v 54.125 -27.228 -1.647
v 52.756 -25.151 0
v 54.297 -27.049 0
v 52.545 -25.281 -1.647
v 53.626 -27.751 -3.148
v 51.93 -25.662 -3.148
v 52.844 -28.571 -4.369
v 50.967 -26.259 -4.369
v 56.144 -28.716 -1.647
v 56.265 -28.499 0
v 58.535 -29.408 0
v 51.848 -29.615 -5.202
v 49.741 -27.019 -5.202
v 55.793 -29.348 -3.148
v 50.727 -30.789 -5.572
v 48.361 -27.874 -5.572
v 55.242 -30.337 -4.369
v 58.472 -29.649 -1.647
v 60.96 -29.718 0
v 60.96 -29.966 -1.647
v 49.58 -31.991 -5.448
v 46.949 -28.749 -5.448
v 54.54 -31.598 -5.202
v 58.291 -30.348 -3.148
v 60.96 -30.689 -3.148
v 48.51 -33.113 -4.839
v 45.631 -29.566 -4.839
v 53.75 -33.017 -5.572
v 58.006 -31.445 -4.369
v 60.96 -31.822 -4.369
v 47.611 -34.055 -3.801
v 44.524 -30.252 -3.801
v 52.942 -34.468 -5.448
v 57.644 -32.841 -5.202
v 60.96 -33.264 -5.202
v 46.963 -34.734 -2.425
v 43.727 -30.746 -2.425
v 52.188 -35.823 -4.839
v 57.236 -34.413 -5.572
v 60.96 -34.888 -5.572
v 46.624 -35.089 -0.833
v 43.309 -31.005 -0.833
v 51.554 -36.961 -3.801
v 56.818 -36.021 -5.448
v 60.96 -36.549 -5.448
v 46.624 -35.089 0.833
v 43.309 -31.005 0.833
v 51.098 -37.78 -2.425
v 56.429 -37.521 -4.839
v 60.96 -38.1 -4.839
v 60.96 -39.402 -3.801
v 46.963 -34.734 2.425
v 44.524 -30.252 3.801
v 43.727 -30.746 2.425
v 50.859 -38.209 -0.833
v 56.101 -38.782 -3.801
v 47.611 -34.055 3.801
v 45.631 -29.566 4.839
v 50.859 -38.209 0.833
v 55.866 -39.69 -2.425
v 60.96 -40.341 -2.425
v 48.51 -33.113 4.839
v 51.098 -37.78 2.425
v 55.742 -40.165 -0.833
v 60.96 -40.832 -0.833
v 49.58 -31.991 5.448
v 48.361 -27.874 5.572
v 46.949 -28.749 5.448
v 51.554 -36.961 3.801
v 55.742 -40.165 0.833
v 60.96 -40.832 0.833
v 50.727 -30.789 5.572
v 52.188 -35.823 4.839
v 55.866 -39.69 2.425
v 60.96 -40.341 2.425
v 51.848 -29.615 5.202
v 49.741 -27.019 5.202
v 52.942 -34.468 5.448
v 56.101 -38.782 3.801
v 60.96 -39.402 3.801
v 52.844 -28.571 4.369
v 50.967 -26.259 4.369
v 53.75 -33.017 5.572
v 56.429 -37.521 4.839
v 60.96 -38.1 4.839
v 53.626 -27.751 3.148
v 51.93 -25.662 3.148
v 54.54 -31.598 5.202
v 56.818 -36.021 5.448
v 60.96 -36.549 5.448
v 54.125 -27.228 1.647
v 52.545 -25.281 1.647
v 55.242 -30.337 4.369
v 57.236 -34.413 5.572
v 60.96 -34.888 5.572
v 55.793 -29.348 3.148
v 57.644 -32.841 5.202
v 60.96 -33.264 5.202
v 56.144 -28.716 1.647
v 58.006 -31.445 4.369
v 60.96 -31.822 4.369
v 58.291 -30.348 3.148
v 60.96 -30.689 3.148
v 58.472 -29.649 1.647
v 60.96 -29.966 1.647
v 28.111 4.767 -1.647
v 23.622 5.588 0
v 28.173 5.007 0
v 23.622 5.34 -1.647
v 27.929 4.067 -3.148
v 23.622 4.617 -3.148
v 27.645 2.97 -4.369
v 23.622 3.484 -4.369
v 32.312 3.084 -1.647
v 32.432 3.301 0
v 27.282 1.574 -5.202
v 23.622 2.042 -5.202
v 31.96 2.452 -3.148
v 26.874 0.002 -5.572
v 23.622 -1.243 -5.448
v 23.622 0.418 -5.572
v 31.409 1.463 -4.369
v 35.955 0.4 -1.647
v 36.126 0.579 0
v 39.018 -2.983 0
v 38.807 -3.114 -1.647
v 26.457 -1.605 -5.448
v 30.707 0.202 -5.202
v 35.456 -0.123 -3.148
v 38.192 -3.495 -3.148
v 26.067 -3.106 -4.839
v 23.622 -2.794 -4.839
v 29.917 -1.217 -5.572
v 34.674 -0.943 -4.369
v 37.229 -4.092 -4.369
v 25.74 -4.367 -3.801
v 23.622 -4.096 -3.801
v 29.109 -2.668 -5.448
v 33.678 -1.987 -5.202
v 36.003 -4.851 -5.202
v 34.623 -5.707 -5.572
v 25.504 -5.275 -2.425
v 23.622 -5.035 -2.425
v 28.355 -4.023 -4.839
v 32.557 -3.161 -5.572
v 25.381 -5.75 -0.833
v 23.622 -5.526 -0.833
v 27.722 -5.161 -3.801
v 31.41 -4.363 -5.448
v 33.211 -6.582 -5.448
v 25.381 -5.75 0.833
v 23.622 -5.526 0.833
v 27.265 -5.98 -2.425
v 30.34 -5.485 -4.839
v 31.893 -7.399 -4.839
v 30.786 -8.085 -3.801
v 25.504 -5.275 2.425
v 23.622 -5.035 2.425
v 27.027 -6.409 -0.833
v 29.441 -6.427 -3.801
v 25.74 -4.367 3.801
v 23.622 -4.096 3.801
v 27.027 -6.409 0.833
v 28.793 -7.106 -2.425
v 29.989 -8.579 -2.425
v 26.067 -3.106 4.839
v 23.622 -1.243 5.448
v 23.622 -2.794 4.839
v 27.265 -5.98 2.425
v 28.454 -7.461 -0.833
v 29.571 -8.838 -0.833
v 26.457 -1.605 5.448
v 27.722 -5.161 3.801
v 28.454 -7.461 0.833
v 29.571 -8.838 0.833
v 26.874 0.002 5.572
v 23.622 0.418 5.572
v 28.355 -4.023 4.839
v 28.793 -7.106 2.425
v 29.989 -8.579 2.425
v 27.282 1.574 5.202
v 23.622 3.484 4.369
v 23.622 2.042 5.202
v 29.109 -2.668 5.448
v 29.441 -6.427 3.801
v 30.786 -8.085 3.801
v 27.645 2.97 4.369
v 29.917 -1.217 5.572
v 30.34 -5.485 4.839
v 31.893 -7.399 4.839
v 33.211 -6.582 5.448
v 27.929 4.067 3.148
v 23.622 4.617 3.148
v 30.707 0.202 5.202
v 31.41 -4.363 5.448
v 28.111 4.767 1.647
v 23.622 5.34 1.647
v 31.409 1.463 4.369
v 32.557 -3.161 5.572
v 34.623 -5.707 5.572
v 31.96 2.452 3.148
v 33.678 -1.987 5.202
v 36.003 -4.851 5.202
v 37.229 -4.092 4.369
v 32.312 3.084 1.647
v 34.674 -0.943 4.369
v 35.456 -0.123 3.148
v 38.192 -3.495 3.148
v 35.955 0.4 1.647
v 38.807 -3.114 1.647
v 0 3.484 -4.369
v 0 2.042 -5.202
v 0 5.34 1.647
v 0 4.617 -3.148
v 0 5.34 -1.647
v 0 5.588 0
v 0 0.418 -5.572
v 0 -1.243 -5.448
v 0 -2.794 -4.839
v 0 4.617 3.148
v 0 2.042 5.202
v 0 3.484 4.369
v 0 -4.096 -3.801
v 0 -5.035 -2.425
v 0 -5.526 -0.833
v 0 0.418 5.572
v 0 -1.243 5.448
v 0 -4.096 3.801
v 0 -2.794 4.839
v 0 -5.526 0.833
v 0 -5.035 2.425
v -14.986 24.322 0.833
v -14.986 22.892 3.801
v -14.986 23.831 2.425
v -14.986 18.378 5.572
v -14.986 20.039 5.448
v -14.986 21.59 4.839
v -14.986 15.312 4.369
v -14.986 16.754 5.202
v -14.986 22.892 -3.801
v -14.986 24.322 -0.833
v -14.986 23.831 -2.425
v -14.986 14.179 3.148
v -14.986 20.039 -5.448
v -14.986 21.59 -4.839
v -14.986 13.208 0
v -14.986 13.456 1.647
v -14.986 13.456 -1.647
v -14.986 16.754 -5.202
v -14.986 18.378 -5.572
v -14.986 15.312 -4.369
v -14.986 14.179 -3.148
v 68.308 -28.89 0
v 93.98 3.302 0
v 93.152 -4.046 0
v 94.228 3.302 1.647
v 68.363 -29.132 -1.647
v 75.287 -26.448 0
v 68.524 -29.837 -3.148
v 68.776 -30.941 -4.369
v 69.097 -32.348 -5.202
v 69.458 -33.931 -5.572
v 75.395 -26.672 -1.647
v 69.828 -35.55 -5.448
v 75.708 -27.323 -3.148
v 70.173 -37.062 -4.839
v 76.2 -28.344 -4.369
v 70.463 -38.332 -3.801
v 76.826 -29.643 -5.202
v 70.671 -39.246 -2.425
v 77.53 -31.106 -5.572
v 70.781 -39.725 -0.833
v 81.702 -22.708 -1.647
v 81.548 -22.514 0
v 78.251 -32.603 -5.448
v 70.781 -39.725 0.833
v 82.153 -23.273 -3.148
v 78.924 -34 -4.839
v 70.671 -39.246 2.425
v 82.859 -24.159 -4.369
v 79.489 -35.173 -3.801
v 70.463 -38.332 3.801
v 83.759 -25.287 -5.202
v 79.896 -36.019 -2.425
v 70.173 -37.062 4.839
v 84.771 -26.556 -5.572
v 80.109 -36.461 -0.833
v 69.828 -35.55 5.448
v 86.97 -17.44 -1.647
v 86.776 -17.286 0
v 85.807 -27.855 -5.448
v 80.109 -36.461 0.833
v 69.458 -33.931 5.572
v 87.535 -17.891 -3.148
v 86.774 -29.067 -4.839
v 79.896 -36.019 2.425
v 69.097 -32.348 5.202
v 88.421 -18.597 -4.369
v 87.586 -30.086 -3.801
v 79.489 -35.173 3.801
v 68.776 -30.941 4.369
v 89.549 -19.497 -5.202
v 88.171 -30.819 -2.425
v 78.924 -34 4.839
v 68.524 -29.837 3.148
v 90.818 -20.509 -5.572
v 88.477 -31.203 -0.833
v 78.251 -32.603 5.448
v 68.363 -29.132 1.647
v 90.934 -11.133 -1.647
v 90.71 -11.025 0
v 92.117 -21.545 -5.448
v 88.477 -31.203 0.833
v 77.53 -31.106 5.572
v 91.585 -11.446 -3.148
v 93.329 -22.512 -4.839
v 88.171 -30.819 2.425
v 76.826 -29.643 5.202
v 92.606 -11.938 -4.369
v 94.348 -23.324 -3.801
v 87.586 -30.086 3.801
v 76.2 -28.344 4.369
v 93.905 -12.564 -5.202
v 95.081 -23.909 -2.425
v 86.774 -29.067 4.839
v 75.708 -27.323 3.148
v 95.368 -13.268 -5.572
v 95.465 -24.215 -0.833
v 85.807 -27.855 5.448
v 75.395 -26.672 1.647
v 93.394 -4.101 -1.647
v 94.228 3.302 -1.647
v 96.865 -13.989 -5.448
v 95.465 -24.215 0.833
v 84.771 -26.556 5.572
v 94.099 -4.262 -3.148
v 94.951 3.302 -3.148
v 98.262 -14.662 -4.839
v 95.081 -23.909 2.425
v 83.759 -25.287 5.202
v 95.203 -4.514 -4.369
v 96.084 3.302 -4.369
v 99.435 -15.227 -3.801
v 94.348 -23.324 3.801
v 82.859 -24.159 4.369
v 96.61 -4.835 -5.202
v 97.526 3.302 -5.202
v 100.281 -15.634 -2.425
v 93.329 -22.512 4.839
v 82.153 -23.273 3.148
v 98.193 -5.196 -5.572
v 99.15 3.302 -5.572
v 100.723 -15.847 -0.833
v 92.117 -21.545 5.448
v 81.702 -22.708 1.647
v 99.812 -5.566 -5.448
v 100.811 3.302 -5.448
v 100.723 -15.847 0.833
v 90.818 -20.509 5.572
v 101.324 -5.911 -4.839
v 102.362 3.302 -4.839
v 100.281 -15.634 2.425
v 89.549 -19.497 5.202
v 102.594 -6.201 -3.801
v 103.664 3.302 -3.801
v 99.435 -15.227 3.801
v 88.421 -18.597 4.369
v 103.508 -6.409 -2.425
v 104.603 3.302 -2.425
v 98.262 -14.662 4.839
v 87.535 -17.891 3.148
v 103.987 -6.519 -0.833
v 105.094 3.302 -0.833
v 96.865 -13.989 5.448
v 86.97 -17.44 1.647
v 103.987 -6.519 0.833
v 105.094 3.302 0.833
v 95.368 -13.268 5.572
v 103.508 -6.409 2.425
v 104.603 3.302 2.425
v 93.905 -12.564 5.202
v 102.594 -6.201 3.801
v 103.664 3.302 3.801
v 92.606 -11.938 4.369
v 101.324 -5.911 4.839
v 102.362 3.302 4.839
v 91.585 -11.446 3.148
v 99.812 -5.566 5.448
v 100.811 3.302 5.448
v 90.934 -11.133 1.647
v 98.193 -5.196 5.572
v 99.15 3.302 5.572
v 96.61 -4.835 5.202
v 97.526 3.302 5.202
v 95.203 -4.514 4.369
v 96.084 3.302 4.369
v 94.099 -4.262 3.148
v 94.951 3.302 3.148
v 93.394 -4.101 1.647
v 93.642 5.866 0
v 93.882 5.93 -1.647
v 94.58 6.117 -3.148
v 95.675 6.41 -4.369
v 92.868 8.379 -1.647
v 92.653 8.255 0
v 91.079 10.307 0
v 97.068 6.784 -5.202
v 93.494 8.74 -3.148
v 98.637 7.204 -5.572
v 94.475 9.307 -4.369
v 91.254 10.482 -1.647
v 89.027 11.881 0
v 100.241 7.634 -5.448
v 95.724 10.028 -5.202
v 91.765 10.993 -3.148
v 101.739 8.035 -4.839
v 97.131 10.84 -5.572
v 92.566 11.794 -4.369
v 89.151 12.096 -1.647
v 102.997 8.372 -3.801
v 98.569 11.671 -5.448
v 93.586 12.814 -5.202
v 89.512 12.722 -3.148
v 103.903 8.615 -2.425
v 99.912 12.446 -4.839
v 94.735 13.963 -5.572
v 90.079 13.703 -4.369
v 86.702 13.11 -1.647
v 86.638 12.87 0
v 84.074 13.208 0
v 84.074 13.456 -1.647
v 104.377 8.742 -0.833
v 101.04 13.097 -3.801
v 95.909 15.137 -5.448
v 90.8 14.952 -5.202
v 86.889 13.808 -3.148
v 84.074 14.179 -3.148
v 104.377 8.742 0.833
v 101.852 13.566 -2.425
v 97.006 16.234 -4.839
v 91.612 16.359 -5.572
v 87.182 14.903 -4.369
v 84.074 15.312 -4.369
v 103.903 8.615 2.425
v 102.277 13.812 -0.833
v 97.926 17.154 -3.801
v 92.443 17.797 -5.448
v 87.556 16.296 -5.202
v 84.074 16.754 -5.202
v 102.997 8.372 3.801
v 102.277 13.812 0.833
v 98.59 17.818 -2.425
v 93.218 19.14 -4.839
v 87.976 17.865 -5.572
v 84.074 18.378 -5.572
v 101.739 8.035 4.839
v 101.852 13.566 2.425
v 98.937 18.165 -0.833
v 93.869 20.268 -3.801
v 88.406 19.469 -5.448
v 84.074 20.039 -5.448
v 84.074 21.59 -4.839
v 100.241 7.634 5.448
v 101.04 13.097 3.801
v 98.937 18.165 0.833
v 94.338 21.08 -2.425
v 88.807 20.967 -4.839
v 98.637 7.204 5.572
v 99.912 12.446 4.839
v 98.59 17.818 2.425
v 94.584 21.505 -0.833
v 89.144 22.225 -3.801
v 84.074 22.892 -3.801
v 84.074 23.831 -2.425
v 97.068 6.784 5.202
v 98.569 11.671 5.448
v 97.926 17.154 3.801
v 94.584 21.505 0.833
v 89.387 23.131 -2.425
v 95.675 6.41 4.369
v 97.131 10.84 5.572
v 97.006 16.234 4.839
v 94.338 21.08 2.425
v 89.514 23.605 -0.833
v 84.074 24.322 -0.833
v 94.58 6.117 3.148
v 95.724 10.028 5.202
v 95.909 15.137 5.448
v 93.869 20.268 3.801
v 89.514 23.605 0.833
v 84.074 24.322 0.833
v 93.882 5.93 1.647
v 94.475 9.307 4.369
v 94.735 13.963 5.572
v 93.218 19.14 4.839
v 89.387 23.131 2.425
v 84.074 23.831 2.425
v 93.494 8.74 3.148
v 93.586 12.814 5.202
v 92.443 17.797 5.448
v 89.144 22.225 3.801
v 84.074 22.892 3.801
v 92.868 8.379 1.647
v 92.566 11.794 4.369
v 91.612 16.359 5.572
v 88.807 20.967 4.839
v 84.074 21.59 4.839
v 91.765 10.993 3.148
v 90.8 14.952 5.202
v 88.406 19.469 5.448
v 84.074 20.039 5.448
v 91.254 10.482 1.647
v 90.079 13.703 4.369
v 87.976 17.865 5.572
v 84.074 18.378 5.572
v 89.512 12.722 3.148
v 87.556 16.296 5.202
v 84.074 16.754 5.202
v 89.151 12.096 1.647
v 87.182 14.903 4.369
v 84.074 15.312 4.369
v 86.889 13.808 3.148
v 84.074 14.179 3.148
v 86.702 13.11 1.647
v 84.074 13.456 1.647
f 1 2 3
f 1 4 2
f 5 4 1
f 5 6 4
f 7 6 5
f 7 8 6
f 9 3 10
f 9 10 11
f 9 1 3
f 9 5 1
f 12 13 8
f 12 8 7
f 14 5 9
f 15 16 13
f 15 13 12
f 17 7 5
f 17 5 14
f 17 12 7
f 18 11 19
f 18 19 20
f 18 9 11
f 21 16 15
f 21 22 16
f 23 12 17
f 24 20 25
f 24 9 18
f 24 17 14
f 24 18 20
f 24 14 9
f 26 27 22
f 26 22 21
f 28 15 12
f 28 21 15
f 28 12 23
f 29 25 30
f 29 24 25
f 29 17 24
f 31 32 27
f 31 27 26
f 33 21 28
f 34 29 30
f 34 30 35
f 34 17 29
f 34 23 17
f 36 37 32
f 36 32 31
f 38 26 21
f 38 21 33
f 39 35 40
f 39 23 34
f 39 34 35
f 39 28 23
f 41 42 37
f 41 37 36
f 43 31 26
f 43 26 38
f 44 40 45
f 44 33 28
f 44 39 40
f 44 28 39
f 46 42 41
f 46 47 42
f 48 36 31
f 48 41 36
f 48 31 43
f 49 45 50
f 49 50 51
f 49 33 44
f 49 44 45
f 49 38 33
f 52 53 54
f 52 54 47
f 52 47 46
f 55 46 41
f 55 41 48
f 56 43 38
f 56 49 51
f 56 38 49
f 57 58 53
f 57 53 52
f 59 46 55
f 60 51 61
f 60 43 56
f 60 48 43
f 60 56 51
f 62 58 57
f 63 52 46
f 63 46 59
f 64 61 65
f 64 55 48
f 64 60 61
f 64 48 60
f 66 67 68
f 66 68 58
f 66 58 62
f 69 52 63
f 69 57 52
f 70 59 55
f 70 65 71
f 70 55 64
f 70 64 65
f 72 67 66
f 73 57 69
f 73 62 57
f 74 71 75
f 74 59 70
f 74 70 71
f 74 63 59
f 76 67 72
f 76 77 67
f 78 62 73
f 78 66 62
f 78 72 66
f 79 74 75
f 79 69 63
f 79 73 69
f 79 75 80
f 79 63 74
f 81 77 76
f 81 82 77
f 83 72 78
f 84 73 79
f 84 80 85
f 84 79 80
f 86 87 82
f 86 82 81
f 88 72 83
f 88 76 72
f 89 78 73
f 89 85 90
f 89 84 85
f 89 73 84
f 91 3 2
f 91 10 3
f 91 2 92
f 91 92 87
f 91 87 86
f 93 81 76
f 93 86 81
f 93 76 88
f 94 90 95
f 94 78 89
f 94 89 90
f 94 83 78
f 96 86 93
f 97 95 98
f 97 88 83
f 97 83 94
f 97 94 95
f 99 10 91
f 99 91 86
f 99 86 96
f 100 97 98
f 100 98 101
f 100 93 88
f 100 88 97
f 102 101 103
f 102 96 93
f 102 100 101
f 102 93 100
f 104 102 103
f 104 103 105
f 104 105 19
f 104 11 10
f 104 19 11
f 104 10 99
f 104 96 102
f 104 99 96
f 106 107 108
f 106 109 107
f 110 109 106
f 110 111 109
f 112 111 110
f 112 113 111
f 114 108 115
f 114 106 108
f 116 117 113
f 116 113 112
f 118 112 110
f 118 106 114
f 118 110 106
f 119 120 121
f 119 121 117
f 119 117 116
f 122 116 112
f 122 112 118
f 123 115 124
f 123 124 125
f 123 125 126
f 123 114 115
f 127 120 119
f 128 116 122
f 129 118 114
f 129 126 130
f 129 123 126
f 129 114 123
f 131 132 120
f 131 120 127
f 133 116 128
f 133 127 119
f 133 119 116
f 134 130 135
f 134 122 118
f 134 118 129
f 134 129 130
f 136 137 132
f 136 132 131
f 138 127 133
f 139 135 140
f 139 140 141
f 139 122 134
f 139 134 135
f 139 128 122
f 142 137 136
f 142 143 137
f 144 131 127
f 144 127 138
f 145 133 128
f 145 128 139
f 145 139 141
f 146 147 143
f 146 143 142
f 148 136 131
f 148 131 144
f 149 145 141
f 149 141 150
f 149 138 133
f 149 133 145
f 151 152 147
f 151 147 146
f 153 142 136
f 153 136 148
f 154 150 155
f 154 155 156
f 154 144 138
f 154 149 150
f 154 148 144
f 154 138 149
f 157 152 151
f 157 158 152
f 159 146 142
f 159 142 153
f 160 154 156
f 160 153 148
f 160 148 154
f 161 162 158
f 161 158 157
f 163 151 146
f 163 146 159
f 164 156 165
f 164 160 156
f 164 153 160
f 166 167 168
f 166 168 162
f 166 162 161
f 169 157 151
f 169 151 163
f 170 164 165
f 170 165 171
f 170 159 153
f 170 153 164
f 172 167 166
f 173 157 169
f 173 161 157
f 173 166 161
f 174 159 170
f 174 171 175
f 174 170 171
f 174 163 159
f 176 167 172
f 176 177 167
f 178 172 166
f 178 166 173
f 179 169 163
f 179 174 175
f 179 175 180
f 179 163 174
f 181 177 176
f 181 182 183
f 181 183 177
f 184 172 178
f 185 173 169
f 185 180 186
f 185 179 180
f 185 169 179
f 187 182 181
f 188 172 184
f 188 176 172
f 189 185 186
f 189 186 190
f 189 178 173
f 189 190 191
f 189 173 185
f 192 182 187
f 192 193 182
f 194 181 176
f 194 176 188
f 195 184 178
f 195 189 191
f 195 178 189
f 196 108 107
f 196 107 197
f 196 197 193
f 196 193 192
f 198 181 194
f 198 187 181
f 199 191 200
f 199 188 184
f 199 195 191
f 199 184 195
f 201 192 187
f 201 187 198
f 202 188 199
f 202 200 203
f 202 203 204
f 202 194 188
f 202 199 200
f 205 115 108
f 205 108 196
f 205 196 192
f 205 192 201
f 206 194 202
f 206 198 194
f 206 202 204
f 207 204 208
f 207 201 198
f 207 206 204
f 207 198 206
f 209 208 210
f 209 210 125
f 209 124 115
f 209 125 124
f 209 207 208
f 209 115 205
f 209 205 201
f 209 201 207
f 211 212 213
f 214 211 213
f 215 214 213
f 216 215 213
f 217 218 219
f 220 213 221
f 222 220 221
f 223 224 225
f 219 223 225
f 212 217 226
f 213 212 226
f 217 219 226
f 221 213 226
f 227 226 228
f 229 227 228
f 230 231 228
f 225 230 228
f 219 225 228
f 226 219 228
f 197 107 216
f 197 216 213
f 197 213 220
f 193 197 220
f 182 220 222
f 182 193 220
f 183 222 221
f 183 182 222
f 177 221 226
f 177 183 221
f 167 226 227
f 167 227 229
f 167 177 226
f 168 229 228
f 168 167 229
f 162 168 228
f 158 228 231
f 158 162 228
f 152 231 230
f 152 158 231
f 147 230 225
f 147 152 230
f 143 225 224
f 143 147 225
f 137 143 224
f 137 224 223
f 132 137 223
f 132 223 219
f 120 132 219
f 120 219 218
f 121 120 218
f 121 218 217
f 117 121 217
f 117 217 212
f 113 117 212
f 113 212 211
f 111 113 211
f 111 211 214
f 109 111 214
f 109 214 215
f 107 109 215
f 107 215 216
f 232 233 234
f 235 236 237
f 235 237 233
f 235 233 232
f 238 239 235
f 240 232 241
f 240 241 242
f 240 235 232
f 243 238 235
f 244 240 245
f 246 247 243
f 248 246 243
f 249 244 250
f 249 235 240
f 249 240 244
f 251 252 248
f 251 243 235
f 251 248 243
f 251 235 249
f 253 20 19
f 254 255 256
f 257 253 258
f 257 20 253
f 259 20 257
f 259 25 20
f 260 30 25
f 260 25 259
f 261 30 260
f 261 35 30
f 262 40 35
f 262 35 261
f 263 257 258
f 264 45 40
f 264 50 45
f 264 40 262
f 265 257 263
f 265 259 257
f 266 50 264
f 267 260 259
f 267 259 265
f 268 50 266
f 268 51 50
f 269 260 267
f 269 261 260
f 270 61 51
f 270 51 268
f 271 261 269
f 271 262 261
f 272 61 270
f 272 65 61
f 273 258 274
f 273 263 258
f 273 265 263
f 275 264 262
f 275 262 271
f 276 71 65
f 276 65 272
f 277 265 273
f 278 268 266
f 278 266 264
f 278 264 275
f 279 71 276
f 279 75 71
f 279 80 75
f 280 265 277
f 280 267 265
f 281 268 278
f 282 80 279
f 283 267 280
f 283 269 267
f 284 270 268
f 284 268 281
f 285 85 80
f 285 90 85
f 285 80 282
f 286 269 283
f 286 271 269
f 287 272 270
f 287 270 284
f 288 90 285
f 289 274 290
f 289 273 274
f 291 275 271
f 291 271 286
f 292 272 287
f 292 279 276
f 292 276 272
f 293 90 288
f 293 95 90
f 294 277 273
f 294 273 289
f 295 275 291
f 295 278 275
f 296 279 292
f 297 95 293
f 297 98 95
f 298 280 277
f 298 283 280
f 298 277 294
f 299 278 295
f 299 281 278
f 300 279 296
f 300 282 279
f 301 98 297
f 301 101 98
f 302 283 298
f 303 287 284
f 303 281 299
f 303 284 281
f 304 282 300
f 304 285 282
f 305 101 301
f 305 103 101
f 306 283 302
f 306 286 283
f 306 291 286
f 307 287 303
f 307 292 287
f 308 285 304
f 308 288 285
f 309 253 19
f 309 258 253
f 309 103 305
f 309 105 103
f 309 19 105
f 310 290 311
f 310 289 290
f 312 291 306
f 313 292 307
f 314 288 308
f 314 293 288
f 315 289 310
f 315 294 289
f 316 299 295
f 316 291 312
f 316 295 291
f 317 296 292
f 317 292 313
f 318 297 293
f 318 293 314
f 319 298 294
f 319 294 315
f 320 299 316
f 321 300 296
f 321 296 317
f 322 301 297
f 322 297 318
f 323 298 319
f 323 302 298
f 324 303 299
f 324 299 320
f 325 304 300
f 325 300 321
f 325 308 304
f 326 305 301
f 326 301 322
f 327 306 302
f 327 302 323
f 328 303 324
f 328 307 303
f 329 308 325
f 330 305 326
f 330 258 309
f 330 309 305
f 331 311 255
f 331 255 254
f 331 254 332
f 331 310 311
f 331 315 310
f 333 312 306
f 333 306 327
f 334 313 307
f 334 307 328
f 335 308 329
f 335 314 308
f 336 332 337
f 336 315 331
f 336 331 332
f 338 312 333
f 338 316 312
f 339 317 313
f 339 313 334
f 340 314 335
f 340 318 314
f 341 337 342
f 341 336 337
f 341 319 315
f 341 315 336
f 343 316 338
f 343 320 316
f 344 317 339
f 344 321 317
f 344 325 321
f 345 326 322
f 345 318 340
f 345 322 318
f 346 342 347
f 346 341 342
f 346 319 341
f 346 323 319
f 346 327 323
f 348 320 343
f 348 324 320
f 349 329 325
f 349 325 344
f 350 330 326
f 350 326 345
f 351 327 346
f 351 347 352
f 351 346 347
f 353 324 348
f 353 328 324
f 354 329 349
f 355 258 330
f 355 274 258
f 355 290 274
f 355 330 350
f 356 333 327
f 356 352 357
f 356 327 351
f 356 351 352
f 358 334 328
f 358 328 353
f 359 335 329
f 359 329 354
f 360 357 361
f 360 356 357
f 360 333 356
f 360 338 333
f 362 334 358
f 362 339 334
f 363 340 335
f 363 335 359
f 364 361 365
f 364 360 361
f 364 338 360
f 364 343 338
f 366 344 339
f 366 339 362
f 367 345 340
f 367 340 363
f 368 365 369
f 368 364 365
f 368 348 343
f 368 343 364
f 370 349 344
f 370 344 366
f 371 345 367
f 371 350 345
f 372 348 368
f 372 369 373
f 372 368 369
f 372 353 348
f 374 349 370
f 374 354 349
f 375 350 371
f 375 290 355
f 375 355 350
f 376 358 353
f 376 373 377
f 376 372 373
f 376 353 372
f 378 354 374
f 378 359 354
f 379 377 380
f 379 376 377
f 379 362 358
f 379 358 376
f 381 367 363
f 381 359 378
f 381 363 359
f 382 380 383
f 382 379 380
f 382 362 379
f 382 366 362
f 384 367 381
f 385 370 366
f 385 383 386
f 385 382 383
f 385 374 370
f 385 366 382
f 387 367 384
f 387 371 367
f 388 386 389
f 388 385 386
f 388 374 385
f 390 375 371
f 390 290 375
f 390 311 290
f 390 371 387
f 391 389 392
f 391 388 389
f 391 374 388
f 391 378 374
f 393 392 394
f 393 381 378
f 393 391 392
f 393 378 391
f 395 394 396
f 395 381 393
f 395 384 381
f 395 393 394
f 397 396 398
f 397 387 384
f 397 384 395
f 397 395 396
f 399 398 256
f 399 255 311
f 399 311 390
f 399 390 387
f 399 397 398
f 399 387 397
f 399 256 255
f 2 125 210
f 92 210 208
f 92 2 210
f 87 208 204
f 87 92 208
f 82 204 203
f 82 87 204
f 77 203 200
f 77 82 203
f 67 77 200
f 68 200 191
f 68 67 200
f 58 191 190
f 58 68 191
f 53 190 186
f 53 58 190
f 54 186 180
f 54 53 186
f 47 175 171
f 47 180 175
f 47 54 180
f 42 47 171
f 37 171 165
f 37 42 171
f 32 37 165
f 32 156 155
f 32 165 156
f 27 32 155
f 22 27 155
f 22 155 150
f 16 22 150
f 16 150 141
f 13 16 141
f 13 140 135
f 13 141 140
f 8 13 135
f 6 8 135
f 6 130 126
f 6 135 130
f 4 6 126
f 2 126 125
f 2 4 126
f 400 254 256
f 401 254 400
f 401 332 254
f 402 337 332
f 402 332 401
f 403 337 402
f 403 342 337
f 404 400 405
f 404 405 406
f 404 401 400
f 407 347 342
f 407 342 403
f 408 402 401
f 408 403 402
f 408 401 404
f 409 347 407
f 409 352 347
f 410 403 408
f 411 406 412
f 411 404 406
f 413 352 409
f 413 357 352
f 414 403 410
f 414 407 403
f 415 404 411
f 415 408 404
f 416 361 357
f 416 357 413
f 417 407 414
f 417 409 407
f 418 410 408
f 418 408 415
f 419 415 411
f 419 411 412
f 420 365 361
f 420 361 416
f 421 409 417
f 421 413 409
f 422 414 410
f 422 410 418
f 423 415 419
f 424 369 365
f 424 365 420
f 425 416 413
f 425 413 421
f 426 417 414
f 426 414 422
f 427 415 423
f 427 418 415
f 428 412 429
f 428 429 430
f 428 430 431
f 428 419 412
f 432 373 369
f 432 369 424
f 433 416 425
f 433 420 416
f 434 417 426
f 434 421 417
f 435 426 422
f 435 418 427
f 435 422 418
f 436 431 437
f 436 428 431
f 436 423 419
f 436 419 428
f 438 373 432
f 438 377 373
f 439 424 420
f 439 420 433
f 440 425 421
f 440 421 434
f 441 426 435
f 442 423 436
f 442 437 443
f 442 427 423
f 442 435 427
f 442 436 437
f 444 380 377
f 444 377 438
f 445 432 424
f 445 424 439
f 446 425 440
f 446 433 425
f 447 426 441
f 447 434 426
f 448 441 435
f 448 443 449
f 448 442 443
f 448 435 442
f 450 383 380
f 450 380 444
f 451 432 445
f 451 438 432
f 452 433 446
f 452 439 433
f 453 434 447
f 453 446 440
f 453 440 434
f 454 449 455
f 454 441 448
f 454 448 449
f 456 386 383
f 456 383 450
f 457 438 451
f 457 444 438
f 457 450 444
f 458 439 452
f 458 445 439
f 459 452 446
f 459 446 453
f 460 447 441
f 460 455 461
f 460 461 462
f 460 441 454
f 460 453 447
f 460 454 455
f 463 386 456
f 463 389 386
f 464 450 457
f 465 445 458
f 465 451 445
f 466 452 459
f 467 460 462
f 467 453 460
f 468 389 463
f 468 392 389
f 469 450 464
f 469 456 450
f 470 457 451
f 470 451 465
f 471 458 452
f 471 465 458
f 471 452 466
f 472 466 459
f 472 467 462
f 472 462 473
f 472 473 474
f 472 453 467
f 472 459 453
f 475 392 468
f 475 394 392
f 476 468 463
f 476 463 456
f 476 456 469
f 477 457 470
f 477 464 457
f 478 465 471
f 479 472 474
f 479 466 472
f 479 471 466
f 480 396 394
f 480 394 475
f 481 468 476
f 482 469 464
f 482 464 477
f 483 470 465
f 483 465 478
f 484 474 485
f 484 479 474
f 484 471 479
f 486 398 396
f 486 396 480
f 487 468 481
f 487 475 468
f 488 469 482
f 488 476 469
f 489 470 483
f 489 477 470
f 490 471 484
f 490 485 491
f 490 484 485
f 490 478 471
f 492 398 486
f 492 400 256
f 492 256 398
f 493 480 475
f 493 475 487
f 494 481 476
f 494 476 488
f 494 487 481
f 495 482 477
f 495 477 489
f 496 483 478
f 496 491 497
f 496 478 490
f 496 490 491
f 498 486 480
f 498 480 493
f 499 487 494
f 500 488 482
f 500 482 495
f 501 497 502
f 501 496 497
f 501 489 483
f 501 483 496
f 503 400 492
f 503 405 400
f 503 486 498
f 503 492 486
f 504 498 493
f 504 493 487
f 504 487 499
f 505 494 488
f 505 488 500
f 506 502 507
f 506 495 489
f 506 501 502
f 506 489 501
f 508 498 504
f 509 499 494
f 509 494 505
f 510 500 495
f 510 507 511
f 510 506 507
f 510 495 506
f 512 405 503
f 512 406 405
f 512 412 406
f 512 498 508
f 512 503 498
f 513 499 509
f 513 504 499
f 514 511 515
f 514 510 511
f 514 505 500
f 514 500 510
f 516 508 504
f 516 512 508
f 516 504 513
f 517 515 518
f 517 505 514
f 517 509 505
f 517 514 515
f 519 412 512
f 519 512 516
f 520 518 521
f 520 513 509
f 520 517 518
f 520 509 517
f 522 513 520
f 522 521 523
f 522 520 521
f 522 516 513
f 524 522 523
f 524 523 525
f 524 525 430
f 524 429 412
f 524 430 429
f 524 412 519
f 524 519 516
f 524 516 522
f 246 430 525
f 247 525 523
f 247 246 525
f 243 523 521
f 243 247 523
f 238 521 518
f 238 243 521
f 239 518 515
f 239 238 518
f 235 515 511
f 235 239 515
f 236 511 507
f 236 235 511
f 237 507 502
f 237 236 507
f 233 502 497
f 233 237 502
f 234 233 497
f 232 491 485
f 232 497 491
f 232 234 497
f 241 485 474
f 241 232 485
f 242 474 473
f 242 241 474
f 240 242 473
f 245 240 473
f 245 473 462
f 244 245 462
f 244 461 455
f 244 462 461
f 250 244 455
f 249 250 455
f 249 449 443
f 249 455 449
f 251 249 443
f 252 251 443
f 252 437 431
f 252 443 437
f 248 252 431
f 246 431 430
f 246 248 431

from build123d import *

# Parameters (mm, degrees)
SWEEP1_PROFILE_R = 5.588


with BuildPart() as part:
    # Sweep1: sweep along a path in Sketch1
    with BuildLine(Plane.XY) as sweep1_path:
        Line((0, 0), (23.622, 0))
        ThreePointArc((23.622, 0), (29.714292142, -1.581578377), (34.267947791, -5.92687859))
        Line((34.267947791, -5.92687859), (48.006, -28.09416816))
        ThreePointArc((48.006, -28.09416816), (53.546892782, -33.381533837), (60.96, -35.306))
        ThreePointArc((60.96, -35.306), (88.259978608, -23.997978608), (99.568, 3.302))
        ThreePointArc((99.568, 3.302), (95.029912468, 14.257912468), (84.074, 18.796))
        Line((84.074, 18.796), (-14.986, 18.796))
    # Sweep1 profile (on start of the path) → Sweep1 (sweep)
    with BuildSketch(Plane.YZ):
        Circle(SWEEP1_PROFILE_R)
    sweep(path=sweep1_path.line)


solid = part.part
